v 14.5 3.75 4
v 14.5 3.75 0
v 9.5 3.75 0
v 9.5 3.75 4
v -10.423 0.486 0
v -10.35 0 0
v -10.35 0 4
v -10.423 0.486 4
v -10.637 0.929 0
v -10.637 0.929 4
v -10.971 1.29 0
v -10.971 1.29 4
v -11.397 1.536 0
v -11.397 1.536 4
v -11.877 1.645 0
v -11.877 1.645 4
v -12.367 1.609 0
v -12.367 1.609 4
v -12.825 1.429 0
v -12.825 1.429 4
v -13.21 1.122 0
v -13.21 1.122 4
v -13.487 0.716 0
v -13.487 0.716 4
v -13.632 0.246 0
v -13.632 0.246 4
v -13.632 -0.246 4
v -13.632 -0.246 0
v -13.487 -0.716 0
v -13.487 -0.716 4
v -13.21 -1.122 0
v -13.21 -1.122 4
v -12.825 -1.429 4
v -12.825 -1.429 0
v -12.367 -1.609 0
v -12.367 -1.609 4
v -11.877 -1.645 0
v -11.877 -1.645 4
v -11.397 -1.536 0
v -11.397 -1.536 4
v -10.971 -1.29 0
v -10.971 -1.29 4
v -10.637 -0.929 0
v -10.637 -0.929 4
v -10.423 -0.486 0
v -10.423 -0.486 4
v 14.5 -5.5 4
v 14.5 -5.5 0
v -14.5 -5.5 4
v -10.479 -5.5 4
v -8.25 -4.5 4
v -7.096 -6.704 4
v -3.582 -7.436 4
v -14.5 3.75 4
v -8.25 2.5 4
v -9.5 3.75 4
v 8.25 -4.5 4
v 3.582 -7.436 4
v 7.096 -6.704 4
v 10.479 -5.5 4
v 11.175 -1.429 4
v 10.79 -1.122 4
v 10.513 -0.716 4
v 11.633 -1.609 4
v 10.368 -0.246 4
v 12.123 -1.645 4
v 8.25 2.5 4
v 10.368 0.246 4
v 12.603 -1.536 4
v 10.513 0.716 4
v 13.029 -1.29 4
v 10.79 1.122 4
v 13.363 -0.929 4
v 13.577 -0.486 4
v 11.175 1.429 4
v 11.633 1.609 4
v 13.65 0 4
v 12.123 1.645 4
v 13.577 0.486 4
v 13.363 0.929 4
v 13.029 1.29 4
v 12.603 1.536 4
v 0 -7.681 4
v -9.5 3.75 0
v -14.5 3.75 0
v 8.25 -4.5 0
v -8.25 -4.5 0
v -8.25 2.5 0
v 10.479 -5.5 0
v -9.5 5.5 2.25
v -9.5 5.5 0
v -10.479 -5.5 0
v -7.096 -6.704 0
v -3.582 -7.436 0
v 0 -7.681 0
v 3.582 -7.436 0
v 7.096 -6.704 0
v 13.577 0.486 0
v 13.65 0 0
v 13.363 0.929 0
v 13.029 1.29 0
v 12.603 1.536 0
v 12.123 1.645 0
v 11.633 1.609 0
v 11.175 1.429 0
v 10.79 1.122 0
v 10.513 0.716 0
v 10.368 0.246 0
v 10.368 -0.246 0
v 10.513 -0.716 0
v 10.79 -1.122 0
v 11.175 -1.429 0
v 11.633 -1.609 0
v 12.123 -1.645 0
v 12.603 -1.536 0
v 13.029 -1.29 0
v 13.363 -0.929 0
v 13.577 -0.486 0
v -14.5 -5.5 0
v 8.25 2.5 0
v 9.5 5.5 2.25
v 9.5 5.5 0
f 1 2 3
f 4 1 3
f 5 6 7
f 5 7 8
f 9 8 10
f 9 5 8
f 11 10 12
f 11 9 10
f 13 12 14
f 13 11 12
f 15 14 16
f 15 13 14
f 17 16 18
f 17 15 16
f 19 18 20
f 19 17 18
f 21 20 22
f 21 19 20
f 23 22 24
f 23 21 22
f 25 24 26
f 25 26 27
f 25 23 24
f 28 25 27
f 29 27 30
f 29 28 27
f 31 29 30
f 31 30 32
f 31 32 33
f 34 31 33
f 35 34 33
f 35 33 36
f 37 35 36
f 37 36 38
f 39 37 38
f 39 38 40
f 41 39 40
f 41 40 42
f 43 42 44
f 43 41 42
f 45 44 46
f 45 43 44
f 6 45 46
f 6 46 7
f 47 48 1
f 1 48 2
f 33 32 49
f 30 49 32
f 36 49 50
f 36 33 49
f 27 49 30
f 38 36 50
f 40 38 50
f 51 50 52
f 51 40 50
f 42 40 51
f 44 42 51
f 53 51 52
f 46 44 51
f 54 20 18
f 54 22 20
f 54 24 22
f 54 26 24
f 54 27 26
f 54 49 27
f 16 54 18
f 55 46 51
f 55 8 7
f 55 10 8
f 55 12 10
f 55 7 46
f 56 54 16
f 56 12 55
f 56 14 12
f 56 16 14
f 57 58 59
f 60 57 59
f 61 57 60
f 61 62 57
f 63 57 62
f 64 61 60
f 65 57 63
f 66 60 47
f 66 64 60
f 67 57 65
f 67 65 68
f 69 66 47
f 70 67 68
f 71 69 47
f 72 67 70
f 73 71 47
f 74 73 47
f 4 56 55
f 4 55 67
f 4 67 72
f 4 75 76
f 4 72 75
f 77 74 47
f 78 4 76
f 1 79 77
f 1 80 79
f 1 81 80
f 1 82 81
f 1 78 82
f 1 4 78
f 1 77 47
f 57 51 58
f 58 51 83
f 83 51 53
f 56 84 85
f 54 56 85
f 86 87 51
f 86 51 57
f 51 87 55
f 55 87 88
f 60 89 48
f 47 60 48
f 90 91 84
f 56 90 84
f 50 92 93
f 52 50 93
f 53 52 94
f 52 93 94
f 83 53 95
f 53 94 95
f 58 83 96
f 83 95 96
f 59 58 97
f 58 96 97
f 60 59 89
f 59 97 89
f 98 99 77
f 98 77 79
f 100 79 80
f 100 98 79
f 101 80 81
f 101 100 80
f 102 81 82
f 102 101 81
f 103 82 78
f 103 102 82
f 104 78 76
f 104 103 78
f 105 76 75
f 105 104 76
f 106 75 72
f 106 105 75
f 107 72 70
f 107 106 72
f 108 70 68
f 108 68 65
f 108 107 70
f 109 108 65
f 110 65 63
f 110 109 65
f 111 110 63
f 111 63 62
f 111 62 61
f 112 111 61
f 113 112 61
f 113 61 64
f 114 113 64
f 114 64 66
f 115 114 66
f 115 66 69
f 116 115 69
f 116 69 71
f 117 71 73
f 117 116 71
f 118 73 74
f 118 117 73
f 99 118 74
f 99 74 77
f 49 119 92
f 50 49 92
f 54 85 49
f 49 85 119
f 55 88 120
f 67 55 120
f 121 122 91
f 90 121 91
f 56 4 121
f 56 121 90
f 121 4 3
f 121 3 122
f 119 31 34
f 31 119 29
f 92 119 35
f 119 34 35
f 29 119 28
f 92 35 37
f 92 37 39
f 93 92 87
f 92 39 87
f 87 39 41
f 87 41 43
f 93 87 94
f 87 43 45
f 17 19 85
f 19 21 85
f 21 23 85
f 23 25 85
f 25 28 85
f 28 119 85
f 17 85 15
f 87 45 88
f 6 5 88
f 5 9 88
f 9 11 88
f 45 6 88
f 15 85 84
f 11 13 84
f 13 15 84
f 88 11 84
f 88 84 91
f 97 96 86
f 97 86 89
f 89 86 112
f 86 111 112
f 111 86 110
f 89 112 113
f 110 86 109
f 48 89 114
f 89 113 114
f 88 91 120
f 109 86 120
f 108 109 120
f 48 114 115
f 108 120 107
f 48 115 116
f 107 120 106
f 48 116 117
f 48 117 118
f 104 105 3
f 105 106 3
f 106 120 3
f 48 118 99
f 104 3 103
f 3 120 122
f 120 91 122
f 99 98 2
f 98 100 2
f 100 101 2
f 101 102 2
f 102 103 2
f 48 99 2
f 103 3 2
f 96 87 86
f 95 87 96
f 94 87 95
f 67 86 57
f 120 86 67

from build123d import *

# Parameters (mm, degrees)
F0_R     = 1.65
F0_W     = 16.5
F0_H     = 7
F1_DEPTH = 4
F2_SIZE  = 1.75


with BuildPart() as f1:
    # F0 (on Top) → F1 (new body)
    with BuildSketch(Plane.XY):
        with BuildLine():
            Line((10.478546, -5.5), (14.5, -5.5))
            Line((14.5, -5.5), (14.5, 3.75))
            Line((14.5, 3.75), (9.5, 3.75))
            Line((9.5, 3.75), (9.5, 5.5))
            Line((9.5, 5.5), (-9.5, 5.5))
            Line((-9.5, 5.5), (-9.5, 3.75))
            Line((-9.5, 3.75), (-14.5, 3.75))
            Line((-14.5, 3.75), (-14.5, -5.5))
            Line((-14.5, -5.5), (-10.478546, -5.5))
            ThreePointArc((-10.478546, -5.5), (0, -7.681161), (10.478546, -5.5))
        make_face()
        with Locations((-12, 0)):
            Circle(F0_R, mode=Mode.SUBTRACT)
        with Locations((0, -1)):
            Rectangle(F0_W, F0_H, mode=Mode.SUBTRACT)
        with Locations((12, 0)):
            Circle(F0_R, mode=Mode.SUBTRACT)
    extrude(amount=F1_DEPTH)

    # F2
    f2_edges = [f1.edges().sort_by_distance(p)[0] for p in [
        (0, 5.5, 4),
    ]]
    chamfer(f2_edges, length=F2_SIZE)


solid = f1.part
